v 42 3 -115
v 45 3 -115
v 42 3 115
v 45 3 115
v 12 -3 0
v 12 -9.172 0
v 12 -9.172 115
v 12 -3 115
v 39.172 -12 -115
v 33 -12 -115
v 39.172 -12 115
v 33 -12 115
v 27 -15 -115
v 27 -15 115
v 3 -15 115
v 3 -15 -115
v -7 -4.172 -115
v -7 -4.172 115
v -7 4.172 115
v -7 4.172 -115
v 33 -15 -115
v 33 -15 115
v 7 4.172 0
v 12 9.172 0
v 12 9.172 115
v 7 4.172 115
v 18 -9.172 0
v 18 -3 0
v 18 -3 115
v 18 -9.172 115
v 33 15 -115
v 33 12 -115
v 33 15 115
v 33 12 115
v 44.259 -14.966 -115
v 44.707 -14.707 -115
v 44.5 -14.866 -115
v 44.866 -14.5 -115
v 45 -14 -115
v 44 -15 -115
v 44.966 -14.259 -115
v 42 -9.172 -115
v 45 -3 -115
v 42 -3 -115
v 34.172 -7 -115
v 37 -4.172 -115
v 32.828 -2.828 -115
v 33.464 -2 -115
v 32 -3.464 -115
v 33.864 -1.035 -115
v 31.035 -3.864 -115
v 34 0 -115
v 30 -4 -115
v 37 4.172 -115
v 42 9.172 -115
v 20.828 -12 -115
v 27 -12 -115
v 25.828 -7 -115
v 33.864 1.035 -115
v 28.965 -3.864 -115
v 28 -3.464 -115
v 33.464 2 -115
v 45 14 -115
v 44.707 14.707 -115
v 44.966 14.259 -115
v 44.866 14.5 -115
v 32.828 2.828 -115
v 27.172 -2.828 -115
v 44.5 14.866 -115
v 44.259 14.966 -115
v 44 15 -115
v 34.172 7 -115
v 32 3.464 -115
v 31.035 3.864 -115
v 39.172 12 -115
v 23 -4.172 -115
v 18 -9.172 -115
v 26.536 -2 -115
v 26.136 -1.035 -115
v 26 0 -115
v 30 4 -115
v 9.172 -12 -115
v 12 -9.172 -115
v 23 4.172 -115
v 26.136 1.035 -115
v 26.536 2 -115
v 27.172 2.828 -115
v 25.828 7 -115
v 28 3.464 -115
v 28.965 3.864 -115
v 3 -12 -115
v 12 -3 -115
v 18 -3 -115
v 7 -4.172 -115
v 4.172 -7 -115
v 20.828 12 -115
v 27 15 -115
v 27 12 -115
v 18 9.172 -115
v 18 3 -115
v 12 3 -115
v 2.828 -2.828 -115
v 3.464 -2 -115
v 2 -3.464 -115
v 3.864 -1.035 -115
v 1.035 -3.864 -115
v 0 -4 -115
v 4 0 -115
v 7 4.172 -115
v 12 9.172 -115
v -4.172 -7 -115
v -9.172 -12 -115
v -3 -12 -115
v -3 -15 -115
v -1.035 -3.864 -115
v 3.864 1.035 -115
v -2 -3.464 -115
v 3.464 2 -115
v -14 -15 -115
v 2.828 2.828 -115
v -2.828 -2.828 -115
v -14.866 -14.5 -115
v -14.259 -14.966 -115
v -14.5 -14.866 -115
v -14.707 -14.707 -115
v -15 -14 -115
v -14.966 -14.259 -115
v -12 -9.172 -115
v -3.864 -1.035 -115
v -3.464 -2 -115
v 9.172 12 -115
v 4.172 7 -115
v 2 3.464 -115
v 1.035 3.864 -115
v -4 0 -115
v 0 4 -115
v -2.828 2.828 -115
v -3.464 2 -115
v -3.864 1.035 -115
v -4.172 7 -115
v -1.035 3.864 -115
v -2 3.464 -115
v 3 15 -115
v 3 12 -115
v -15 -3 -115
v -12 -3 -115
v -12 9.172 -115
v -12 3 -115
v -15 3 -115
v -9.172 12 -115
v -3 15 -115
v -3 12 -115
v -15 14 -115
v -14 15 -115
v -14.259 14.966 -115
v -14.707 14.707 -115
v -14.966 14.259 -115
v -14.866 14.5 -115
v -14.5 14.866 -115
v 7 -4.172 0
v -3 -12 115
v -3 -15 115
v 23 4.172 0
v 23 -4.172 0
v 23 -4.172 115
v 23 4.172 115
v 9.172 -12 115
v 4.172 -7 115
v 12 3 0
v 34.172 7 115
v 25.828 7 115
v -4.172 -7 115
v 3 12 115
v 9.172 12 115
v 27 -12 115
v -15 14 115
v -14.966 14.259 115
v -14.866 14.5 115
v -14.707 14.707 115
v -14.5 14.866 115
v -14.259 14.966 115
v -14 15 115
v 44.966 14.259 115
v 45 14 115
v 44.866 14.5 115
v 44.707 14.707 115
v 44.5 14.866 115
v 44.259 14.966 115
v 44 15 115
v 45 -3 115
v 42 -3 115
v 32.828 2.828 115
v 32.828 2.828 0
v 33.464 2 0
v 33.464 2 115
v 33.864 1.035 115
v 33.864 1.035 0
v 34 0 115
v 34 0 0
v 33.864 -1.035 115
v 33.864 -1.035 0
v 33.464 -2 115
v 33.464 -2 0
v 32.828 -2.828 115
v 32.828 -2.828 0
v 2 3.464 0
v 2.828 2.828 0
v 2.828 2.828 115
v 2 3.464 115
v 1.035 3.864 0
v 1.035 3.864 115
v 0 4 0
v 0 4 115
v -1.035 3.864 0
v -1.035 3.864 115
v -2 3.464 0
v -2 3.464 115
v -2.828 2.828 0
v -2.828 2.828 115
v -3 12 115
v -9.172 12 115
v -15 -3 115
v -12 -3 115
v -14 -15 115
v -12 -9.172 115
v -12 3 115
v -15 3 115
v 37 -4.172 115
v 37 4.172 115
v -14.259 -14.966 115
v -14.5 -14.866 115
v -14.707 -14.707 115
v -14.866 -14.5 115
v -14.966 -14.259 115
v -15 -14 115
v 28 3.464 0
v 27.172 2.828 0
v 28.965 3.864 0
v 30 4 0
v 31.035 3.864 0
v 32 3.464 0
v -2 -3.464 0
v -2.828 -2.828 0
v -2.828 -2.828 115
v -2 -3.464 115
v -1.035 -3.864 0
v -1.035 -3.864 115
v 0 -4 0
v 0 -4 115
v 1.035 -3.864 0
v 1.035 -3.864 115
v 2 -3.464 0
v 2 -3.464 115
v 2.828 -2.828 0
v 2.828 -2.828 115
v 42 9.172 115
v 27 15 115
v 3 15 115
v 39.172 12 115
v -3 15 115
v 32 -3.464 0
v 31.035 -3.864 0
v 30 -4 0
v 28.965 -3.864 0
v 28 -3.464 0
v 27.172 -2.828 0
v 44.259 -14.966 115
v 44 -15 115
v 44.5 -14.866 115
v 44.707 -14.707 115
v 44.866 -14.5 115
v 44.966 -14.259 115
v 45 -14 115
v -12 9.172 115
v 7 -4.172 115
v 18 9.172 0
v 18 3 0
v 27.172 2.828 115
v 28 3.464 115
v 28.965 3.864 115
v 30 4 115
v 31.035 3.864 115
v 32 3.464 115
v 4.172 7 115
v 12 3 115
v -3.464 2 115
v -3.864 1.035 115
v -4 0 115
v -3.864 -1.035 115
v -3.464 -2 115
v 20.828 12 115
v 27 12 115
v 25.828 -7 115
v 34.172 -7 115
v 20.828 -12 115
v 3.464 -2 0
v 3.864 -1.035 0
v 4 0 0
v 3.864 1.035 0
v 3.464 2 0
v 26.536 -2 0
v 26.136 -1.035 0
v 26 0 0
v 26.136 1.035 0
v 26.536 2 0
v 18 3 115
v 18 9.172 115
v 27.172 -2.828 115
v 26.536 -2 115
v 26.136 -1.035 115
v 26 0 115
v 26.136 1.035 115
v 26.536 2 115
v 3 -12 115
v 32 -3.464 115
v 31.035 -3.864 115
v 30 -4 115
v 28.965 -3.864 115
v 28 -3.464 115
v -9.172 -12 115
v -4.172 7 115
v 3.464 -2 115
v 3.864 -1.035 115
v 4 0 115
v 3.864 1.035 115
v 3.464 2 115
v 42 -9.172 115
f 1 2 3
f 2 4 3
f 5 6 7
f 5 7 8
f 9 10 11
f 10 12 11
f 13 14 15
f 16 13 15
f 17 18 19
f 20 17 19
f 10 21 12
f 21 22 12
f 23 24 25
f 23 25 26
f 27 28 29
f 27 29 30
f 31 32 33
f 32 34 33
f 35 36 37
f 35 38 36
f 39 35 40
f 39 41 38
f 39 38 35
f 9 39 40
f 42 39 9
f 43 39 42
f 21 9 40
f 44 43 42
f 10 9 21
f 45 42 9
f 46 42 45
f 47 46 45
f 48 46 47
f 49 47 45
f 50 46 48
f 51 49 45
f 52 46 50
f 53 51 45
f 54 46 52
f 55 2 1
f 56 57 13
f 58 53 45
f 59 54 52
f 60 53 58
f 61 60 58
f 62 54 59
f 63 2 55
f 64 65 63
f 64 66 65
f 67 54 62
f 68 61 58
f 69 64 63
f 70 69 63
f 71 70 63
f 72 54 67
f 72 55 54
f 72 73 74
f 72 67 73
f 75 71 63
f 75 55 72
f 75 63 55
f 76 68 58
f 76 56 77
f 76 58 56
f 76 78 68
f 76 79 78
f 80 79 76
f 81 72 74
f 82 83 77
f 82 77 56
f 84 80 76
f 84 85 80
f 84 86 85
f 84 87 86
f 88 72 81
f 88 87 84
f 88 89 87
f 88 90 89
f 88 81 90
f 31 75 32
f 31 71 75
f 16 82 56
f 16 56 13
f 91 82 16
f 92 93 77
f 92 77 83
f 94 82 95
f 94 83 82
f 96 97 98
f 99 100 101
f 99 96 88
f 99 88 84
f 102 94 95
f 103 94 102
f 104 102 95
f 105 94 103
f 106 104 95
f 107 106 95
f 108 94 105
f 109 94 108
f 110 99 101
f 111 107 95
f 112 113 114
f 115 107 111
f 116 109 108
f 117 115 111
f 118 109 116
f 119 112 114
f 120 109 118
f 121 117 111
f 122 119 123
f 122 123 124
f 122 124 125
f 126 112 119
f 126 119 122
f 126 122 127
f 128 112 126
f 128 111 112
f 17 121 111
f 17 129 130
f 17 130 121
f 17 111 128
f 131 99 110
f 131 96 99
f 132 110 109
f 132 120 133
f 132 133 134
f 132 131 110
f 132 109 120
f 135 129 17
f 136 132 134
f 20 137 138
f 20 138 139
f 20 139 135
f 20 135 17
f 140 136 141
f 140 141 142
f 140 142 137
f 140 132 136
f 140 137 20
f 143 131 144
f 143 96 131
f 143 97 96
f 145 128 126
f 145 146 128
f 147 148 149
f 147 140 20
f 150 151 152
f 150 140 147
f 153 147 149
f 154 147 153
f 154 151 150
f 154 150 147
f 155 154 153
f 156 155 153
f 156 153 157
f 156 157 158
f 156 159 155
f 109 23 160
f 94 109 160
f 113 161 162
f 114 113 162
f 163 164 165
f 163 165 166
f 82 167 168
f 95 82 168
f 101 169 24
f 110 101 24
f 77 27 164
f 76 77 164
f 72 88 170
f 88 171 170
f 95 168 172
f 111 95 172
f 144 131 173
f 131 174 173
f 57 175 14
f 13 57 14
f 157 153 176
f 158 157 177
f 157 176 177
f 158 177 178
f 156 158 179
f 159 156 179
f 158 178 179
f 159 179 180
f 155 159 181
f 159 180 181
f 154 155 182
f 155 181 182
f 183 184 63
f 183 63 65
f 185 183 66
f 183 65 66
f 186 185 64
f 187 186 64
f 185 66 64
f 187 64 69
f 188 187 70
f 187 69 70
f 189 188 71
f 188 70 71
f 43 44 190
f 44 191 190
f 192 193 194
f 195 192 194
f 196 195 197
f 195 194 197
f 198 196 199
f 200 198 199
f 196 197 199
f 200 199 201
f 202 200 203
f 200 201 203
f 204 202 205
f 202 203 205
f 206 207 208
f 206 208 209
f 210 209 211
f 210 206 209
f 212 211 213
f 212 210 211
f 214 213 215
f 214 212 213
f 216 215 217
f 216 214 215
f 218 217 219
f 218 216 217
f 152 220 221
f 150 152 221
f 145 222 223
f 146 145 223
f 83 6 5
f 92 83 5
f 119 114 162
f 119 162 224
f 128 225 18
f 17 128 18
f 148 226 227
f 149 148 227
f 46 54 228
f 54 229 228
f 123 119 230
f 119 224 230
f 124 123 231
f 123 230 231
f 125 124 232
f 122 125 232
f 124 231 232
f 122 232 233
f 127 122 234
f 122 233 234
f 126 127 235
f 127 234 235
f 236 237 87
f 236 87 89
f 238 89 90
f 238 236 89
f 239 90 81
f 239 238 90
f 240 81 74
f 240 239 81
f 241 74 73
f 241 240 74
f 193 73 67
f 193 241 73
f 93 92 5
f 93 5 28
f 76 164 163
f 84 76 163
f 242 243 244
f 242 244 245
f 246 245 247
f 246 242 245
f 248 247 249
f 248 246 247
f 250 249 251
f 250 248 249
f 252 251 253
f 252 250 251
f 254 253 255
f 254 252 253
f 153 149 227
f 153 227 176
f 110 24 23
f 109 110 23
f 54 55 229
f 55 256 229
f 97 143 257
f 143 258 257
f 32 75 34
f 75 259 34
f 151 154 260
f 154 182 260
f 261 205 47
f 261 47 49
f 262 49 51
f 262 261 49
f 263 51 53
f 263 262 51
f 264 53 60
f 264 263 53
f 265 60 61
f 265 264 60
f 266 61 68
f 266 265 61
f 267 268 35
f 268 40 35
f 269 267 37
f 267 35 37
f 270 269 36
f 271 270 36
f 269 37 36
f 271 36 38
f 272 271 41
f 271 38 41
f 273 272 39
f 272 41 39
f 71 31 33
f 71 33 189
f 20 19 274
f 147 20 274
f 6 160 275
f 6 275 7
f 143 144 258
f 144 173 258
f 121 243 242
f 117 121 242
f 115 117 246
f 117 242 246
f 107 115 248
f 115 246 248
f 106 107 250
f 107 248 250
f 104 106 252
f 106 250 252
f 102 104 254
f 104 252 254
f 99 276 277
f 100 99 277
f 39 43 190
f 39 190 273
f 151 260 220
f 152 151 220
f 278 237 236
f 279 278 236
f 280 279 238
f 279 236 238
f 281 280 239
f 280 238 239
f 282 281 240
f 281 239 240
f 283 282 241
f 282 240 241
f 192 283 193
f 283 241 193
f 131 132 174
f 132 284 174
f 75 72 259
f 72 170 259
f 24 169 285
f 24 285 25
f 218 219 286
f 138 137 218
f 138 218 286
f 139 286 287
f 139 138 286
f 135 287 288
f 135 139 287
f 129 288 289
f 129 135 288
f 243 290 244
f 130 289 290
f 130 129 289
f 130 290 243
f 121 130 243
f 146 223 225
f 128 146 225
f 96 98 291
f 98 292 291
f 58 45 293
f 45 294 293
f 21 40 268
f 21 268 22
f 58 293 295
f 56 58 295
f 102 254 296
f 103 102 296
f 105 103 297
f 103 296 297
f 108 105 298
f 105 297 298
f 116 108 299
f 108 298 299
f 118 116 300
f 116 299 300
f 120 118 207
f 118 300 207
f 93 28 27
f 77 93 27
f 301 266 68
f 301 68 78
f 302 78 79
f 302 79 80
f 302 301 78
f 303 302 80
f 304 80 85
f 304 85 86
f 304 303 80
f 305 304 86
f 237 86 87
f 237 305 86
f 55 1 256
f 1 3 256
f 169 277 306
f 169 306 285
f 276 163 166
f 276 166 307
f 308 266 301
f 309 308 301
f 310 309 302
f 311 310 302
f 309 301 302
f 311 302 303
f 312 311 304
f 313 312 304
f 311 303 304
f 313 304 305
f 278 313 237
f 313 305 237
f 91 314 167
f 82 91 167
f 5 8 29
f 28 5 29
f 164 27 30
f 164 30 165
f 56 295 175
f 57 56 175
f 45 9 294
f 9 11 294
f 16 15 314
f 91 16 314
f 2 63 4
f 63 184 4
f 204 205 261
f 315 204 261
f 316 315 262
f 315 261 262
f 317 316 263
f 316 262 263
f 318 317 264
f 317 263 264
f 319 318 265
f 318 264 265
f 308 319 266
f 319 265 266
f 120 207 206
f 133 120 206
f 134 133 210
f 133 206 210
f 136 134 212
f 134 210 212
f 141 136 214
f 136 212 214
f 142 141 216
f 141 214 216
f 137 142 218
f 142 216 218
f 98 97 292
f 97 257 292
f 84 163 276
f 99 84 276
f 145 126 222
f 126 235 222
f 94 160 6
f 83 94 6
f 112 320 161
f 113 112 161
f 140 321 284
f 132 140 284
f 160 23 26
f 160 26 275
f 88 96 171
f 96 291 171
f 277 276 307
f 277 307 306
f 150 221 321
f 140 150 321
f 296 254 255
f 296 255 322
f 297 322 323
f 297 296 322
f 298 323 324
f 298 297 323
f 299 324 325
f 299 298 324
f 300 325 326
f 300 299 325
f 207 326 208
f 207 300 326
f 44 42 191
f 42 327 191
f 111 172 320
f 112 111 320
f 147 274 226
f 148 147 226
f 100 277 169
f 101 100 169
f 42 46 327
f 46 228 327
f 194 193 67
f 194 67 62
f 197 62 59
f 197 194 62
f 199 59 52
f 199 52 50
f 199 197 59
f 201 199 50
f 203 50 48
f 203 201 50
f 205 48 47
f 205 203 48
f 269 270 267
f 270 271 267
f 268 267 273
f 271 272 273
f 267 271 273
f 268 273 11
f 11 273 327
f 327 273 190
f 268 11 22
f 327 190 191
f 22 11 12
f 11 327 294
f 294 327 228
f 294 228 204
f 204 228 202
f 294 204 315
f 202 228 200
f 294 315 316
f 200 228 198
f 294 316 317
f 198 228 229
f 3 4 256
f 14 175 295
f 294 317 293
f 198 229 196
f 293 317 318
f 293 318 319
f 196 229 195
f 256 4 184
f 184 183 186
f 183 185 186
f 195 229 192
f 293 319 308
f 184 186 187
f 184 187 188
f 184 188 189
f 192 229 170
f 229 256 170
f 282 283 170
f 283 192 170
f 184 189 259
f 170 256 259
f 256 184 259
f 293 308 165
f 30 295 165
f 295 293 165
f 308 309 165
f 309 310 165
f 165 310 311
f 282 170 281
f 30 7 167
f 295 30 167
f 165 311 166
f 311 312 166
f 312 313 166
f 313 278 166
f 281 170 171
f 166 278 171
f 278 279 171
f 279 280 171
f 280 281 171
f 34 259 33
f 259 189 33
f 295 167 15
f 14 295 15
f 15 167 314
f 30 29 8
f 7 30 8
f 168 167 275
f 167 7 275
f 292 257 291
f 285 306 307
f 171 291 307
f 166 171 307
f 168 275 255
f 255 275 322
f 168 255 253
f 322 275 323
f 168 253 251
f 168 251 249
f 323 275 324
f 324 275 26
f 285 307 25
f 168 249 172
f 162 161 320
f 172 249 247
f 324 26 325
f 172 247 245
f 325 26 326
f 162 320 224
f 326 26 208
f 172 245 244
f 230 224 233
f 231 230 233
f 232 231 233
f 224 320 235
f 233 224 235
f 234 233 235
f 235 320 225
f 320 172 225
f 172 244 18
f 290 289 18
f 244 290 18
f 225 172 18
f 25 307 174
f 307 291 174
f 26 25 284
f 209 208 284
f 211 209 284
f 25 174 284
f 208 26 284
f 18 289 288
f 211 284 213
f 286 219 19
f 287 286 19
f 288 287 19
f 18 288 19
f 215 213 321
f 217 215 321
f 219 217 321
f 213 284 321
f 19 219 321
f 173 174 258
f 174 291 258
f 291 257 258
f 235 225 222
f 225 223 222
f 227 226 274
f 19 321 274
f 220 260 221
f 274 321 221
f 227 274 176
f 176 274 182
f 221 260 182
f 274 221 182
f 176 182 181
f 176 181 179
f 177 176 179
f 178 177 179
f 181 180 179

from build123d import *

# Parameters (mm, degrees)
SALIENTE_EXTRUIR1_DEPTH = 115
REDONDEO1_R             = 1


with BuildPart() as part:
    # Croquis1 → Saliente-Extruir1 (new body, symmetric)
    with BuildSketch(Plane.XY):
        Polygon((-4.171572875, 7), (4.171572875, 7), (9.171572875, 12), (3, 12), (3, 15), (27, 15), (27, 12), (20.828427125, 12), (25.828427125, 7), (34.171572875, 7), (39.171572875, 12), (33, 12), (33, 15), (45, 15), (45, 3), (42, 3), (42, 9.171572875), (37, 4.171572875), (37, -4.171572875), (42, -9.171572875), (42, -3), (45, -3), (45, -15), (33, -15), (33, -12), (39.171572875, -12), (34.171572875, -7), (25.828427125, -7), (20.828427125, -12), (27, -12), (27, -15), (3, -15), (3, -12), (9.171572875, -12), (4.171572875, -7), (-4.171572875, -7), (-9.171572875, -12), (-3, -12), (-3, -15), (-15, -15), (-15, -3), (-12, -3), (-12, -9.171572875), (-7, -4.171572875), (-7, 4.171572875), (-12, 9.171572875), (-12, 3), (-15, 3), (-15, 15), (-3, 15), (-3, 12), (-9.171572875, 12), align=None)
        Polygon((7, 4.171572875), (7, -4.171572875), (12, -9.171572875), (12, -3), (18, -3), (18, -9.171572875), (23, -4.171572875), (23, 4.171572875), (18, 9.171572875), (18, 3), (12, 3), (12, 9.171572875), align=None, mode=Mode.SUBTRACT)
        with BuildLine():
            ThreePointArc((2.828427125, 2.828427125), (0, 4), (-2.828427125, 2.828427125))
            ThreePointArc((-2.828427125, 2.828427125), (-4, 0), (-2.828427125, -2.828427125))
            ThreePointArc((-2.828427125, -2.828427125), (0, -4), (2.828427125, -2.828427125))
            ThreePointArc((2.828427125, -2.828427125), (4, 0), (2.828427125, 2.828427125))
        make_face(mode=Mode.SUBTRACT)
        with BuildLine():
            ThreePointArc((32.828427125, 2.828427125), (34, 0), (32.828427125, -2.828427125))
            ThreePointArc((32.828427125, -2.828427125), (30, -4), (27.171572875, -2.828427125))
            ThreePointArc((27.171572875, -2.828427125), (26, 0), (27.171572875, 2.828427125))
            ThreePointArc((27.171572875, 2.828427125), (30, 4), (32.828427125, 2.828427125))
        make_face(mode=Mode.SUBTRACT)
    extrude(amount=SALIENTE_EXTRUIR1_DEPTH, both=True)

    # Redondeo1
    redondeo1_edges = [part.edges().sort_by_distance(p)[0] for p in [
        (-15, 15, 0),
        (45, 15, 0),
        (45, -15, 0),
        (-15, -15, 0),
    ]]
    fillet(redondeo1_edges, radius=REDONDEO1_R)


solid = part.part
